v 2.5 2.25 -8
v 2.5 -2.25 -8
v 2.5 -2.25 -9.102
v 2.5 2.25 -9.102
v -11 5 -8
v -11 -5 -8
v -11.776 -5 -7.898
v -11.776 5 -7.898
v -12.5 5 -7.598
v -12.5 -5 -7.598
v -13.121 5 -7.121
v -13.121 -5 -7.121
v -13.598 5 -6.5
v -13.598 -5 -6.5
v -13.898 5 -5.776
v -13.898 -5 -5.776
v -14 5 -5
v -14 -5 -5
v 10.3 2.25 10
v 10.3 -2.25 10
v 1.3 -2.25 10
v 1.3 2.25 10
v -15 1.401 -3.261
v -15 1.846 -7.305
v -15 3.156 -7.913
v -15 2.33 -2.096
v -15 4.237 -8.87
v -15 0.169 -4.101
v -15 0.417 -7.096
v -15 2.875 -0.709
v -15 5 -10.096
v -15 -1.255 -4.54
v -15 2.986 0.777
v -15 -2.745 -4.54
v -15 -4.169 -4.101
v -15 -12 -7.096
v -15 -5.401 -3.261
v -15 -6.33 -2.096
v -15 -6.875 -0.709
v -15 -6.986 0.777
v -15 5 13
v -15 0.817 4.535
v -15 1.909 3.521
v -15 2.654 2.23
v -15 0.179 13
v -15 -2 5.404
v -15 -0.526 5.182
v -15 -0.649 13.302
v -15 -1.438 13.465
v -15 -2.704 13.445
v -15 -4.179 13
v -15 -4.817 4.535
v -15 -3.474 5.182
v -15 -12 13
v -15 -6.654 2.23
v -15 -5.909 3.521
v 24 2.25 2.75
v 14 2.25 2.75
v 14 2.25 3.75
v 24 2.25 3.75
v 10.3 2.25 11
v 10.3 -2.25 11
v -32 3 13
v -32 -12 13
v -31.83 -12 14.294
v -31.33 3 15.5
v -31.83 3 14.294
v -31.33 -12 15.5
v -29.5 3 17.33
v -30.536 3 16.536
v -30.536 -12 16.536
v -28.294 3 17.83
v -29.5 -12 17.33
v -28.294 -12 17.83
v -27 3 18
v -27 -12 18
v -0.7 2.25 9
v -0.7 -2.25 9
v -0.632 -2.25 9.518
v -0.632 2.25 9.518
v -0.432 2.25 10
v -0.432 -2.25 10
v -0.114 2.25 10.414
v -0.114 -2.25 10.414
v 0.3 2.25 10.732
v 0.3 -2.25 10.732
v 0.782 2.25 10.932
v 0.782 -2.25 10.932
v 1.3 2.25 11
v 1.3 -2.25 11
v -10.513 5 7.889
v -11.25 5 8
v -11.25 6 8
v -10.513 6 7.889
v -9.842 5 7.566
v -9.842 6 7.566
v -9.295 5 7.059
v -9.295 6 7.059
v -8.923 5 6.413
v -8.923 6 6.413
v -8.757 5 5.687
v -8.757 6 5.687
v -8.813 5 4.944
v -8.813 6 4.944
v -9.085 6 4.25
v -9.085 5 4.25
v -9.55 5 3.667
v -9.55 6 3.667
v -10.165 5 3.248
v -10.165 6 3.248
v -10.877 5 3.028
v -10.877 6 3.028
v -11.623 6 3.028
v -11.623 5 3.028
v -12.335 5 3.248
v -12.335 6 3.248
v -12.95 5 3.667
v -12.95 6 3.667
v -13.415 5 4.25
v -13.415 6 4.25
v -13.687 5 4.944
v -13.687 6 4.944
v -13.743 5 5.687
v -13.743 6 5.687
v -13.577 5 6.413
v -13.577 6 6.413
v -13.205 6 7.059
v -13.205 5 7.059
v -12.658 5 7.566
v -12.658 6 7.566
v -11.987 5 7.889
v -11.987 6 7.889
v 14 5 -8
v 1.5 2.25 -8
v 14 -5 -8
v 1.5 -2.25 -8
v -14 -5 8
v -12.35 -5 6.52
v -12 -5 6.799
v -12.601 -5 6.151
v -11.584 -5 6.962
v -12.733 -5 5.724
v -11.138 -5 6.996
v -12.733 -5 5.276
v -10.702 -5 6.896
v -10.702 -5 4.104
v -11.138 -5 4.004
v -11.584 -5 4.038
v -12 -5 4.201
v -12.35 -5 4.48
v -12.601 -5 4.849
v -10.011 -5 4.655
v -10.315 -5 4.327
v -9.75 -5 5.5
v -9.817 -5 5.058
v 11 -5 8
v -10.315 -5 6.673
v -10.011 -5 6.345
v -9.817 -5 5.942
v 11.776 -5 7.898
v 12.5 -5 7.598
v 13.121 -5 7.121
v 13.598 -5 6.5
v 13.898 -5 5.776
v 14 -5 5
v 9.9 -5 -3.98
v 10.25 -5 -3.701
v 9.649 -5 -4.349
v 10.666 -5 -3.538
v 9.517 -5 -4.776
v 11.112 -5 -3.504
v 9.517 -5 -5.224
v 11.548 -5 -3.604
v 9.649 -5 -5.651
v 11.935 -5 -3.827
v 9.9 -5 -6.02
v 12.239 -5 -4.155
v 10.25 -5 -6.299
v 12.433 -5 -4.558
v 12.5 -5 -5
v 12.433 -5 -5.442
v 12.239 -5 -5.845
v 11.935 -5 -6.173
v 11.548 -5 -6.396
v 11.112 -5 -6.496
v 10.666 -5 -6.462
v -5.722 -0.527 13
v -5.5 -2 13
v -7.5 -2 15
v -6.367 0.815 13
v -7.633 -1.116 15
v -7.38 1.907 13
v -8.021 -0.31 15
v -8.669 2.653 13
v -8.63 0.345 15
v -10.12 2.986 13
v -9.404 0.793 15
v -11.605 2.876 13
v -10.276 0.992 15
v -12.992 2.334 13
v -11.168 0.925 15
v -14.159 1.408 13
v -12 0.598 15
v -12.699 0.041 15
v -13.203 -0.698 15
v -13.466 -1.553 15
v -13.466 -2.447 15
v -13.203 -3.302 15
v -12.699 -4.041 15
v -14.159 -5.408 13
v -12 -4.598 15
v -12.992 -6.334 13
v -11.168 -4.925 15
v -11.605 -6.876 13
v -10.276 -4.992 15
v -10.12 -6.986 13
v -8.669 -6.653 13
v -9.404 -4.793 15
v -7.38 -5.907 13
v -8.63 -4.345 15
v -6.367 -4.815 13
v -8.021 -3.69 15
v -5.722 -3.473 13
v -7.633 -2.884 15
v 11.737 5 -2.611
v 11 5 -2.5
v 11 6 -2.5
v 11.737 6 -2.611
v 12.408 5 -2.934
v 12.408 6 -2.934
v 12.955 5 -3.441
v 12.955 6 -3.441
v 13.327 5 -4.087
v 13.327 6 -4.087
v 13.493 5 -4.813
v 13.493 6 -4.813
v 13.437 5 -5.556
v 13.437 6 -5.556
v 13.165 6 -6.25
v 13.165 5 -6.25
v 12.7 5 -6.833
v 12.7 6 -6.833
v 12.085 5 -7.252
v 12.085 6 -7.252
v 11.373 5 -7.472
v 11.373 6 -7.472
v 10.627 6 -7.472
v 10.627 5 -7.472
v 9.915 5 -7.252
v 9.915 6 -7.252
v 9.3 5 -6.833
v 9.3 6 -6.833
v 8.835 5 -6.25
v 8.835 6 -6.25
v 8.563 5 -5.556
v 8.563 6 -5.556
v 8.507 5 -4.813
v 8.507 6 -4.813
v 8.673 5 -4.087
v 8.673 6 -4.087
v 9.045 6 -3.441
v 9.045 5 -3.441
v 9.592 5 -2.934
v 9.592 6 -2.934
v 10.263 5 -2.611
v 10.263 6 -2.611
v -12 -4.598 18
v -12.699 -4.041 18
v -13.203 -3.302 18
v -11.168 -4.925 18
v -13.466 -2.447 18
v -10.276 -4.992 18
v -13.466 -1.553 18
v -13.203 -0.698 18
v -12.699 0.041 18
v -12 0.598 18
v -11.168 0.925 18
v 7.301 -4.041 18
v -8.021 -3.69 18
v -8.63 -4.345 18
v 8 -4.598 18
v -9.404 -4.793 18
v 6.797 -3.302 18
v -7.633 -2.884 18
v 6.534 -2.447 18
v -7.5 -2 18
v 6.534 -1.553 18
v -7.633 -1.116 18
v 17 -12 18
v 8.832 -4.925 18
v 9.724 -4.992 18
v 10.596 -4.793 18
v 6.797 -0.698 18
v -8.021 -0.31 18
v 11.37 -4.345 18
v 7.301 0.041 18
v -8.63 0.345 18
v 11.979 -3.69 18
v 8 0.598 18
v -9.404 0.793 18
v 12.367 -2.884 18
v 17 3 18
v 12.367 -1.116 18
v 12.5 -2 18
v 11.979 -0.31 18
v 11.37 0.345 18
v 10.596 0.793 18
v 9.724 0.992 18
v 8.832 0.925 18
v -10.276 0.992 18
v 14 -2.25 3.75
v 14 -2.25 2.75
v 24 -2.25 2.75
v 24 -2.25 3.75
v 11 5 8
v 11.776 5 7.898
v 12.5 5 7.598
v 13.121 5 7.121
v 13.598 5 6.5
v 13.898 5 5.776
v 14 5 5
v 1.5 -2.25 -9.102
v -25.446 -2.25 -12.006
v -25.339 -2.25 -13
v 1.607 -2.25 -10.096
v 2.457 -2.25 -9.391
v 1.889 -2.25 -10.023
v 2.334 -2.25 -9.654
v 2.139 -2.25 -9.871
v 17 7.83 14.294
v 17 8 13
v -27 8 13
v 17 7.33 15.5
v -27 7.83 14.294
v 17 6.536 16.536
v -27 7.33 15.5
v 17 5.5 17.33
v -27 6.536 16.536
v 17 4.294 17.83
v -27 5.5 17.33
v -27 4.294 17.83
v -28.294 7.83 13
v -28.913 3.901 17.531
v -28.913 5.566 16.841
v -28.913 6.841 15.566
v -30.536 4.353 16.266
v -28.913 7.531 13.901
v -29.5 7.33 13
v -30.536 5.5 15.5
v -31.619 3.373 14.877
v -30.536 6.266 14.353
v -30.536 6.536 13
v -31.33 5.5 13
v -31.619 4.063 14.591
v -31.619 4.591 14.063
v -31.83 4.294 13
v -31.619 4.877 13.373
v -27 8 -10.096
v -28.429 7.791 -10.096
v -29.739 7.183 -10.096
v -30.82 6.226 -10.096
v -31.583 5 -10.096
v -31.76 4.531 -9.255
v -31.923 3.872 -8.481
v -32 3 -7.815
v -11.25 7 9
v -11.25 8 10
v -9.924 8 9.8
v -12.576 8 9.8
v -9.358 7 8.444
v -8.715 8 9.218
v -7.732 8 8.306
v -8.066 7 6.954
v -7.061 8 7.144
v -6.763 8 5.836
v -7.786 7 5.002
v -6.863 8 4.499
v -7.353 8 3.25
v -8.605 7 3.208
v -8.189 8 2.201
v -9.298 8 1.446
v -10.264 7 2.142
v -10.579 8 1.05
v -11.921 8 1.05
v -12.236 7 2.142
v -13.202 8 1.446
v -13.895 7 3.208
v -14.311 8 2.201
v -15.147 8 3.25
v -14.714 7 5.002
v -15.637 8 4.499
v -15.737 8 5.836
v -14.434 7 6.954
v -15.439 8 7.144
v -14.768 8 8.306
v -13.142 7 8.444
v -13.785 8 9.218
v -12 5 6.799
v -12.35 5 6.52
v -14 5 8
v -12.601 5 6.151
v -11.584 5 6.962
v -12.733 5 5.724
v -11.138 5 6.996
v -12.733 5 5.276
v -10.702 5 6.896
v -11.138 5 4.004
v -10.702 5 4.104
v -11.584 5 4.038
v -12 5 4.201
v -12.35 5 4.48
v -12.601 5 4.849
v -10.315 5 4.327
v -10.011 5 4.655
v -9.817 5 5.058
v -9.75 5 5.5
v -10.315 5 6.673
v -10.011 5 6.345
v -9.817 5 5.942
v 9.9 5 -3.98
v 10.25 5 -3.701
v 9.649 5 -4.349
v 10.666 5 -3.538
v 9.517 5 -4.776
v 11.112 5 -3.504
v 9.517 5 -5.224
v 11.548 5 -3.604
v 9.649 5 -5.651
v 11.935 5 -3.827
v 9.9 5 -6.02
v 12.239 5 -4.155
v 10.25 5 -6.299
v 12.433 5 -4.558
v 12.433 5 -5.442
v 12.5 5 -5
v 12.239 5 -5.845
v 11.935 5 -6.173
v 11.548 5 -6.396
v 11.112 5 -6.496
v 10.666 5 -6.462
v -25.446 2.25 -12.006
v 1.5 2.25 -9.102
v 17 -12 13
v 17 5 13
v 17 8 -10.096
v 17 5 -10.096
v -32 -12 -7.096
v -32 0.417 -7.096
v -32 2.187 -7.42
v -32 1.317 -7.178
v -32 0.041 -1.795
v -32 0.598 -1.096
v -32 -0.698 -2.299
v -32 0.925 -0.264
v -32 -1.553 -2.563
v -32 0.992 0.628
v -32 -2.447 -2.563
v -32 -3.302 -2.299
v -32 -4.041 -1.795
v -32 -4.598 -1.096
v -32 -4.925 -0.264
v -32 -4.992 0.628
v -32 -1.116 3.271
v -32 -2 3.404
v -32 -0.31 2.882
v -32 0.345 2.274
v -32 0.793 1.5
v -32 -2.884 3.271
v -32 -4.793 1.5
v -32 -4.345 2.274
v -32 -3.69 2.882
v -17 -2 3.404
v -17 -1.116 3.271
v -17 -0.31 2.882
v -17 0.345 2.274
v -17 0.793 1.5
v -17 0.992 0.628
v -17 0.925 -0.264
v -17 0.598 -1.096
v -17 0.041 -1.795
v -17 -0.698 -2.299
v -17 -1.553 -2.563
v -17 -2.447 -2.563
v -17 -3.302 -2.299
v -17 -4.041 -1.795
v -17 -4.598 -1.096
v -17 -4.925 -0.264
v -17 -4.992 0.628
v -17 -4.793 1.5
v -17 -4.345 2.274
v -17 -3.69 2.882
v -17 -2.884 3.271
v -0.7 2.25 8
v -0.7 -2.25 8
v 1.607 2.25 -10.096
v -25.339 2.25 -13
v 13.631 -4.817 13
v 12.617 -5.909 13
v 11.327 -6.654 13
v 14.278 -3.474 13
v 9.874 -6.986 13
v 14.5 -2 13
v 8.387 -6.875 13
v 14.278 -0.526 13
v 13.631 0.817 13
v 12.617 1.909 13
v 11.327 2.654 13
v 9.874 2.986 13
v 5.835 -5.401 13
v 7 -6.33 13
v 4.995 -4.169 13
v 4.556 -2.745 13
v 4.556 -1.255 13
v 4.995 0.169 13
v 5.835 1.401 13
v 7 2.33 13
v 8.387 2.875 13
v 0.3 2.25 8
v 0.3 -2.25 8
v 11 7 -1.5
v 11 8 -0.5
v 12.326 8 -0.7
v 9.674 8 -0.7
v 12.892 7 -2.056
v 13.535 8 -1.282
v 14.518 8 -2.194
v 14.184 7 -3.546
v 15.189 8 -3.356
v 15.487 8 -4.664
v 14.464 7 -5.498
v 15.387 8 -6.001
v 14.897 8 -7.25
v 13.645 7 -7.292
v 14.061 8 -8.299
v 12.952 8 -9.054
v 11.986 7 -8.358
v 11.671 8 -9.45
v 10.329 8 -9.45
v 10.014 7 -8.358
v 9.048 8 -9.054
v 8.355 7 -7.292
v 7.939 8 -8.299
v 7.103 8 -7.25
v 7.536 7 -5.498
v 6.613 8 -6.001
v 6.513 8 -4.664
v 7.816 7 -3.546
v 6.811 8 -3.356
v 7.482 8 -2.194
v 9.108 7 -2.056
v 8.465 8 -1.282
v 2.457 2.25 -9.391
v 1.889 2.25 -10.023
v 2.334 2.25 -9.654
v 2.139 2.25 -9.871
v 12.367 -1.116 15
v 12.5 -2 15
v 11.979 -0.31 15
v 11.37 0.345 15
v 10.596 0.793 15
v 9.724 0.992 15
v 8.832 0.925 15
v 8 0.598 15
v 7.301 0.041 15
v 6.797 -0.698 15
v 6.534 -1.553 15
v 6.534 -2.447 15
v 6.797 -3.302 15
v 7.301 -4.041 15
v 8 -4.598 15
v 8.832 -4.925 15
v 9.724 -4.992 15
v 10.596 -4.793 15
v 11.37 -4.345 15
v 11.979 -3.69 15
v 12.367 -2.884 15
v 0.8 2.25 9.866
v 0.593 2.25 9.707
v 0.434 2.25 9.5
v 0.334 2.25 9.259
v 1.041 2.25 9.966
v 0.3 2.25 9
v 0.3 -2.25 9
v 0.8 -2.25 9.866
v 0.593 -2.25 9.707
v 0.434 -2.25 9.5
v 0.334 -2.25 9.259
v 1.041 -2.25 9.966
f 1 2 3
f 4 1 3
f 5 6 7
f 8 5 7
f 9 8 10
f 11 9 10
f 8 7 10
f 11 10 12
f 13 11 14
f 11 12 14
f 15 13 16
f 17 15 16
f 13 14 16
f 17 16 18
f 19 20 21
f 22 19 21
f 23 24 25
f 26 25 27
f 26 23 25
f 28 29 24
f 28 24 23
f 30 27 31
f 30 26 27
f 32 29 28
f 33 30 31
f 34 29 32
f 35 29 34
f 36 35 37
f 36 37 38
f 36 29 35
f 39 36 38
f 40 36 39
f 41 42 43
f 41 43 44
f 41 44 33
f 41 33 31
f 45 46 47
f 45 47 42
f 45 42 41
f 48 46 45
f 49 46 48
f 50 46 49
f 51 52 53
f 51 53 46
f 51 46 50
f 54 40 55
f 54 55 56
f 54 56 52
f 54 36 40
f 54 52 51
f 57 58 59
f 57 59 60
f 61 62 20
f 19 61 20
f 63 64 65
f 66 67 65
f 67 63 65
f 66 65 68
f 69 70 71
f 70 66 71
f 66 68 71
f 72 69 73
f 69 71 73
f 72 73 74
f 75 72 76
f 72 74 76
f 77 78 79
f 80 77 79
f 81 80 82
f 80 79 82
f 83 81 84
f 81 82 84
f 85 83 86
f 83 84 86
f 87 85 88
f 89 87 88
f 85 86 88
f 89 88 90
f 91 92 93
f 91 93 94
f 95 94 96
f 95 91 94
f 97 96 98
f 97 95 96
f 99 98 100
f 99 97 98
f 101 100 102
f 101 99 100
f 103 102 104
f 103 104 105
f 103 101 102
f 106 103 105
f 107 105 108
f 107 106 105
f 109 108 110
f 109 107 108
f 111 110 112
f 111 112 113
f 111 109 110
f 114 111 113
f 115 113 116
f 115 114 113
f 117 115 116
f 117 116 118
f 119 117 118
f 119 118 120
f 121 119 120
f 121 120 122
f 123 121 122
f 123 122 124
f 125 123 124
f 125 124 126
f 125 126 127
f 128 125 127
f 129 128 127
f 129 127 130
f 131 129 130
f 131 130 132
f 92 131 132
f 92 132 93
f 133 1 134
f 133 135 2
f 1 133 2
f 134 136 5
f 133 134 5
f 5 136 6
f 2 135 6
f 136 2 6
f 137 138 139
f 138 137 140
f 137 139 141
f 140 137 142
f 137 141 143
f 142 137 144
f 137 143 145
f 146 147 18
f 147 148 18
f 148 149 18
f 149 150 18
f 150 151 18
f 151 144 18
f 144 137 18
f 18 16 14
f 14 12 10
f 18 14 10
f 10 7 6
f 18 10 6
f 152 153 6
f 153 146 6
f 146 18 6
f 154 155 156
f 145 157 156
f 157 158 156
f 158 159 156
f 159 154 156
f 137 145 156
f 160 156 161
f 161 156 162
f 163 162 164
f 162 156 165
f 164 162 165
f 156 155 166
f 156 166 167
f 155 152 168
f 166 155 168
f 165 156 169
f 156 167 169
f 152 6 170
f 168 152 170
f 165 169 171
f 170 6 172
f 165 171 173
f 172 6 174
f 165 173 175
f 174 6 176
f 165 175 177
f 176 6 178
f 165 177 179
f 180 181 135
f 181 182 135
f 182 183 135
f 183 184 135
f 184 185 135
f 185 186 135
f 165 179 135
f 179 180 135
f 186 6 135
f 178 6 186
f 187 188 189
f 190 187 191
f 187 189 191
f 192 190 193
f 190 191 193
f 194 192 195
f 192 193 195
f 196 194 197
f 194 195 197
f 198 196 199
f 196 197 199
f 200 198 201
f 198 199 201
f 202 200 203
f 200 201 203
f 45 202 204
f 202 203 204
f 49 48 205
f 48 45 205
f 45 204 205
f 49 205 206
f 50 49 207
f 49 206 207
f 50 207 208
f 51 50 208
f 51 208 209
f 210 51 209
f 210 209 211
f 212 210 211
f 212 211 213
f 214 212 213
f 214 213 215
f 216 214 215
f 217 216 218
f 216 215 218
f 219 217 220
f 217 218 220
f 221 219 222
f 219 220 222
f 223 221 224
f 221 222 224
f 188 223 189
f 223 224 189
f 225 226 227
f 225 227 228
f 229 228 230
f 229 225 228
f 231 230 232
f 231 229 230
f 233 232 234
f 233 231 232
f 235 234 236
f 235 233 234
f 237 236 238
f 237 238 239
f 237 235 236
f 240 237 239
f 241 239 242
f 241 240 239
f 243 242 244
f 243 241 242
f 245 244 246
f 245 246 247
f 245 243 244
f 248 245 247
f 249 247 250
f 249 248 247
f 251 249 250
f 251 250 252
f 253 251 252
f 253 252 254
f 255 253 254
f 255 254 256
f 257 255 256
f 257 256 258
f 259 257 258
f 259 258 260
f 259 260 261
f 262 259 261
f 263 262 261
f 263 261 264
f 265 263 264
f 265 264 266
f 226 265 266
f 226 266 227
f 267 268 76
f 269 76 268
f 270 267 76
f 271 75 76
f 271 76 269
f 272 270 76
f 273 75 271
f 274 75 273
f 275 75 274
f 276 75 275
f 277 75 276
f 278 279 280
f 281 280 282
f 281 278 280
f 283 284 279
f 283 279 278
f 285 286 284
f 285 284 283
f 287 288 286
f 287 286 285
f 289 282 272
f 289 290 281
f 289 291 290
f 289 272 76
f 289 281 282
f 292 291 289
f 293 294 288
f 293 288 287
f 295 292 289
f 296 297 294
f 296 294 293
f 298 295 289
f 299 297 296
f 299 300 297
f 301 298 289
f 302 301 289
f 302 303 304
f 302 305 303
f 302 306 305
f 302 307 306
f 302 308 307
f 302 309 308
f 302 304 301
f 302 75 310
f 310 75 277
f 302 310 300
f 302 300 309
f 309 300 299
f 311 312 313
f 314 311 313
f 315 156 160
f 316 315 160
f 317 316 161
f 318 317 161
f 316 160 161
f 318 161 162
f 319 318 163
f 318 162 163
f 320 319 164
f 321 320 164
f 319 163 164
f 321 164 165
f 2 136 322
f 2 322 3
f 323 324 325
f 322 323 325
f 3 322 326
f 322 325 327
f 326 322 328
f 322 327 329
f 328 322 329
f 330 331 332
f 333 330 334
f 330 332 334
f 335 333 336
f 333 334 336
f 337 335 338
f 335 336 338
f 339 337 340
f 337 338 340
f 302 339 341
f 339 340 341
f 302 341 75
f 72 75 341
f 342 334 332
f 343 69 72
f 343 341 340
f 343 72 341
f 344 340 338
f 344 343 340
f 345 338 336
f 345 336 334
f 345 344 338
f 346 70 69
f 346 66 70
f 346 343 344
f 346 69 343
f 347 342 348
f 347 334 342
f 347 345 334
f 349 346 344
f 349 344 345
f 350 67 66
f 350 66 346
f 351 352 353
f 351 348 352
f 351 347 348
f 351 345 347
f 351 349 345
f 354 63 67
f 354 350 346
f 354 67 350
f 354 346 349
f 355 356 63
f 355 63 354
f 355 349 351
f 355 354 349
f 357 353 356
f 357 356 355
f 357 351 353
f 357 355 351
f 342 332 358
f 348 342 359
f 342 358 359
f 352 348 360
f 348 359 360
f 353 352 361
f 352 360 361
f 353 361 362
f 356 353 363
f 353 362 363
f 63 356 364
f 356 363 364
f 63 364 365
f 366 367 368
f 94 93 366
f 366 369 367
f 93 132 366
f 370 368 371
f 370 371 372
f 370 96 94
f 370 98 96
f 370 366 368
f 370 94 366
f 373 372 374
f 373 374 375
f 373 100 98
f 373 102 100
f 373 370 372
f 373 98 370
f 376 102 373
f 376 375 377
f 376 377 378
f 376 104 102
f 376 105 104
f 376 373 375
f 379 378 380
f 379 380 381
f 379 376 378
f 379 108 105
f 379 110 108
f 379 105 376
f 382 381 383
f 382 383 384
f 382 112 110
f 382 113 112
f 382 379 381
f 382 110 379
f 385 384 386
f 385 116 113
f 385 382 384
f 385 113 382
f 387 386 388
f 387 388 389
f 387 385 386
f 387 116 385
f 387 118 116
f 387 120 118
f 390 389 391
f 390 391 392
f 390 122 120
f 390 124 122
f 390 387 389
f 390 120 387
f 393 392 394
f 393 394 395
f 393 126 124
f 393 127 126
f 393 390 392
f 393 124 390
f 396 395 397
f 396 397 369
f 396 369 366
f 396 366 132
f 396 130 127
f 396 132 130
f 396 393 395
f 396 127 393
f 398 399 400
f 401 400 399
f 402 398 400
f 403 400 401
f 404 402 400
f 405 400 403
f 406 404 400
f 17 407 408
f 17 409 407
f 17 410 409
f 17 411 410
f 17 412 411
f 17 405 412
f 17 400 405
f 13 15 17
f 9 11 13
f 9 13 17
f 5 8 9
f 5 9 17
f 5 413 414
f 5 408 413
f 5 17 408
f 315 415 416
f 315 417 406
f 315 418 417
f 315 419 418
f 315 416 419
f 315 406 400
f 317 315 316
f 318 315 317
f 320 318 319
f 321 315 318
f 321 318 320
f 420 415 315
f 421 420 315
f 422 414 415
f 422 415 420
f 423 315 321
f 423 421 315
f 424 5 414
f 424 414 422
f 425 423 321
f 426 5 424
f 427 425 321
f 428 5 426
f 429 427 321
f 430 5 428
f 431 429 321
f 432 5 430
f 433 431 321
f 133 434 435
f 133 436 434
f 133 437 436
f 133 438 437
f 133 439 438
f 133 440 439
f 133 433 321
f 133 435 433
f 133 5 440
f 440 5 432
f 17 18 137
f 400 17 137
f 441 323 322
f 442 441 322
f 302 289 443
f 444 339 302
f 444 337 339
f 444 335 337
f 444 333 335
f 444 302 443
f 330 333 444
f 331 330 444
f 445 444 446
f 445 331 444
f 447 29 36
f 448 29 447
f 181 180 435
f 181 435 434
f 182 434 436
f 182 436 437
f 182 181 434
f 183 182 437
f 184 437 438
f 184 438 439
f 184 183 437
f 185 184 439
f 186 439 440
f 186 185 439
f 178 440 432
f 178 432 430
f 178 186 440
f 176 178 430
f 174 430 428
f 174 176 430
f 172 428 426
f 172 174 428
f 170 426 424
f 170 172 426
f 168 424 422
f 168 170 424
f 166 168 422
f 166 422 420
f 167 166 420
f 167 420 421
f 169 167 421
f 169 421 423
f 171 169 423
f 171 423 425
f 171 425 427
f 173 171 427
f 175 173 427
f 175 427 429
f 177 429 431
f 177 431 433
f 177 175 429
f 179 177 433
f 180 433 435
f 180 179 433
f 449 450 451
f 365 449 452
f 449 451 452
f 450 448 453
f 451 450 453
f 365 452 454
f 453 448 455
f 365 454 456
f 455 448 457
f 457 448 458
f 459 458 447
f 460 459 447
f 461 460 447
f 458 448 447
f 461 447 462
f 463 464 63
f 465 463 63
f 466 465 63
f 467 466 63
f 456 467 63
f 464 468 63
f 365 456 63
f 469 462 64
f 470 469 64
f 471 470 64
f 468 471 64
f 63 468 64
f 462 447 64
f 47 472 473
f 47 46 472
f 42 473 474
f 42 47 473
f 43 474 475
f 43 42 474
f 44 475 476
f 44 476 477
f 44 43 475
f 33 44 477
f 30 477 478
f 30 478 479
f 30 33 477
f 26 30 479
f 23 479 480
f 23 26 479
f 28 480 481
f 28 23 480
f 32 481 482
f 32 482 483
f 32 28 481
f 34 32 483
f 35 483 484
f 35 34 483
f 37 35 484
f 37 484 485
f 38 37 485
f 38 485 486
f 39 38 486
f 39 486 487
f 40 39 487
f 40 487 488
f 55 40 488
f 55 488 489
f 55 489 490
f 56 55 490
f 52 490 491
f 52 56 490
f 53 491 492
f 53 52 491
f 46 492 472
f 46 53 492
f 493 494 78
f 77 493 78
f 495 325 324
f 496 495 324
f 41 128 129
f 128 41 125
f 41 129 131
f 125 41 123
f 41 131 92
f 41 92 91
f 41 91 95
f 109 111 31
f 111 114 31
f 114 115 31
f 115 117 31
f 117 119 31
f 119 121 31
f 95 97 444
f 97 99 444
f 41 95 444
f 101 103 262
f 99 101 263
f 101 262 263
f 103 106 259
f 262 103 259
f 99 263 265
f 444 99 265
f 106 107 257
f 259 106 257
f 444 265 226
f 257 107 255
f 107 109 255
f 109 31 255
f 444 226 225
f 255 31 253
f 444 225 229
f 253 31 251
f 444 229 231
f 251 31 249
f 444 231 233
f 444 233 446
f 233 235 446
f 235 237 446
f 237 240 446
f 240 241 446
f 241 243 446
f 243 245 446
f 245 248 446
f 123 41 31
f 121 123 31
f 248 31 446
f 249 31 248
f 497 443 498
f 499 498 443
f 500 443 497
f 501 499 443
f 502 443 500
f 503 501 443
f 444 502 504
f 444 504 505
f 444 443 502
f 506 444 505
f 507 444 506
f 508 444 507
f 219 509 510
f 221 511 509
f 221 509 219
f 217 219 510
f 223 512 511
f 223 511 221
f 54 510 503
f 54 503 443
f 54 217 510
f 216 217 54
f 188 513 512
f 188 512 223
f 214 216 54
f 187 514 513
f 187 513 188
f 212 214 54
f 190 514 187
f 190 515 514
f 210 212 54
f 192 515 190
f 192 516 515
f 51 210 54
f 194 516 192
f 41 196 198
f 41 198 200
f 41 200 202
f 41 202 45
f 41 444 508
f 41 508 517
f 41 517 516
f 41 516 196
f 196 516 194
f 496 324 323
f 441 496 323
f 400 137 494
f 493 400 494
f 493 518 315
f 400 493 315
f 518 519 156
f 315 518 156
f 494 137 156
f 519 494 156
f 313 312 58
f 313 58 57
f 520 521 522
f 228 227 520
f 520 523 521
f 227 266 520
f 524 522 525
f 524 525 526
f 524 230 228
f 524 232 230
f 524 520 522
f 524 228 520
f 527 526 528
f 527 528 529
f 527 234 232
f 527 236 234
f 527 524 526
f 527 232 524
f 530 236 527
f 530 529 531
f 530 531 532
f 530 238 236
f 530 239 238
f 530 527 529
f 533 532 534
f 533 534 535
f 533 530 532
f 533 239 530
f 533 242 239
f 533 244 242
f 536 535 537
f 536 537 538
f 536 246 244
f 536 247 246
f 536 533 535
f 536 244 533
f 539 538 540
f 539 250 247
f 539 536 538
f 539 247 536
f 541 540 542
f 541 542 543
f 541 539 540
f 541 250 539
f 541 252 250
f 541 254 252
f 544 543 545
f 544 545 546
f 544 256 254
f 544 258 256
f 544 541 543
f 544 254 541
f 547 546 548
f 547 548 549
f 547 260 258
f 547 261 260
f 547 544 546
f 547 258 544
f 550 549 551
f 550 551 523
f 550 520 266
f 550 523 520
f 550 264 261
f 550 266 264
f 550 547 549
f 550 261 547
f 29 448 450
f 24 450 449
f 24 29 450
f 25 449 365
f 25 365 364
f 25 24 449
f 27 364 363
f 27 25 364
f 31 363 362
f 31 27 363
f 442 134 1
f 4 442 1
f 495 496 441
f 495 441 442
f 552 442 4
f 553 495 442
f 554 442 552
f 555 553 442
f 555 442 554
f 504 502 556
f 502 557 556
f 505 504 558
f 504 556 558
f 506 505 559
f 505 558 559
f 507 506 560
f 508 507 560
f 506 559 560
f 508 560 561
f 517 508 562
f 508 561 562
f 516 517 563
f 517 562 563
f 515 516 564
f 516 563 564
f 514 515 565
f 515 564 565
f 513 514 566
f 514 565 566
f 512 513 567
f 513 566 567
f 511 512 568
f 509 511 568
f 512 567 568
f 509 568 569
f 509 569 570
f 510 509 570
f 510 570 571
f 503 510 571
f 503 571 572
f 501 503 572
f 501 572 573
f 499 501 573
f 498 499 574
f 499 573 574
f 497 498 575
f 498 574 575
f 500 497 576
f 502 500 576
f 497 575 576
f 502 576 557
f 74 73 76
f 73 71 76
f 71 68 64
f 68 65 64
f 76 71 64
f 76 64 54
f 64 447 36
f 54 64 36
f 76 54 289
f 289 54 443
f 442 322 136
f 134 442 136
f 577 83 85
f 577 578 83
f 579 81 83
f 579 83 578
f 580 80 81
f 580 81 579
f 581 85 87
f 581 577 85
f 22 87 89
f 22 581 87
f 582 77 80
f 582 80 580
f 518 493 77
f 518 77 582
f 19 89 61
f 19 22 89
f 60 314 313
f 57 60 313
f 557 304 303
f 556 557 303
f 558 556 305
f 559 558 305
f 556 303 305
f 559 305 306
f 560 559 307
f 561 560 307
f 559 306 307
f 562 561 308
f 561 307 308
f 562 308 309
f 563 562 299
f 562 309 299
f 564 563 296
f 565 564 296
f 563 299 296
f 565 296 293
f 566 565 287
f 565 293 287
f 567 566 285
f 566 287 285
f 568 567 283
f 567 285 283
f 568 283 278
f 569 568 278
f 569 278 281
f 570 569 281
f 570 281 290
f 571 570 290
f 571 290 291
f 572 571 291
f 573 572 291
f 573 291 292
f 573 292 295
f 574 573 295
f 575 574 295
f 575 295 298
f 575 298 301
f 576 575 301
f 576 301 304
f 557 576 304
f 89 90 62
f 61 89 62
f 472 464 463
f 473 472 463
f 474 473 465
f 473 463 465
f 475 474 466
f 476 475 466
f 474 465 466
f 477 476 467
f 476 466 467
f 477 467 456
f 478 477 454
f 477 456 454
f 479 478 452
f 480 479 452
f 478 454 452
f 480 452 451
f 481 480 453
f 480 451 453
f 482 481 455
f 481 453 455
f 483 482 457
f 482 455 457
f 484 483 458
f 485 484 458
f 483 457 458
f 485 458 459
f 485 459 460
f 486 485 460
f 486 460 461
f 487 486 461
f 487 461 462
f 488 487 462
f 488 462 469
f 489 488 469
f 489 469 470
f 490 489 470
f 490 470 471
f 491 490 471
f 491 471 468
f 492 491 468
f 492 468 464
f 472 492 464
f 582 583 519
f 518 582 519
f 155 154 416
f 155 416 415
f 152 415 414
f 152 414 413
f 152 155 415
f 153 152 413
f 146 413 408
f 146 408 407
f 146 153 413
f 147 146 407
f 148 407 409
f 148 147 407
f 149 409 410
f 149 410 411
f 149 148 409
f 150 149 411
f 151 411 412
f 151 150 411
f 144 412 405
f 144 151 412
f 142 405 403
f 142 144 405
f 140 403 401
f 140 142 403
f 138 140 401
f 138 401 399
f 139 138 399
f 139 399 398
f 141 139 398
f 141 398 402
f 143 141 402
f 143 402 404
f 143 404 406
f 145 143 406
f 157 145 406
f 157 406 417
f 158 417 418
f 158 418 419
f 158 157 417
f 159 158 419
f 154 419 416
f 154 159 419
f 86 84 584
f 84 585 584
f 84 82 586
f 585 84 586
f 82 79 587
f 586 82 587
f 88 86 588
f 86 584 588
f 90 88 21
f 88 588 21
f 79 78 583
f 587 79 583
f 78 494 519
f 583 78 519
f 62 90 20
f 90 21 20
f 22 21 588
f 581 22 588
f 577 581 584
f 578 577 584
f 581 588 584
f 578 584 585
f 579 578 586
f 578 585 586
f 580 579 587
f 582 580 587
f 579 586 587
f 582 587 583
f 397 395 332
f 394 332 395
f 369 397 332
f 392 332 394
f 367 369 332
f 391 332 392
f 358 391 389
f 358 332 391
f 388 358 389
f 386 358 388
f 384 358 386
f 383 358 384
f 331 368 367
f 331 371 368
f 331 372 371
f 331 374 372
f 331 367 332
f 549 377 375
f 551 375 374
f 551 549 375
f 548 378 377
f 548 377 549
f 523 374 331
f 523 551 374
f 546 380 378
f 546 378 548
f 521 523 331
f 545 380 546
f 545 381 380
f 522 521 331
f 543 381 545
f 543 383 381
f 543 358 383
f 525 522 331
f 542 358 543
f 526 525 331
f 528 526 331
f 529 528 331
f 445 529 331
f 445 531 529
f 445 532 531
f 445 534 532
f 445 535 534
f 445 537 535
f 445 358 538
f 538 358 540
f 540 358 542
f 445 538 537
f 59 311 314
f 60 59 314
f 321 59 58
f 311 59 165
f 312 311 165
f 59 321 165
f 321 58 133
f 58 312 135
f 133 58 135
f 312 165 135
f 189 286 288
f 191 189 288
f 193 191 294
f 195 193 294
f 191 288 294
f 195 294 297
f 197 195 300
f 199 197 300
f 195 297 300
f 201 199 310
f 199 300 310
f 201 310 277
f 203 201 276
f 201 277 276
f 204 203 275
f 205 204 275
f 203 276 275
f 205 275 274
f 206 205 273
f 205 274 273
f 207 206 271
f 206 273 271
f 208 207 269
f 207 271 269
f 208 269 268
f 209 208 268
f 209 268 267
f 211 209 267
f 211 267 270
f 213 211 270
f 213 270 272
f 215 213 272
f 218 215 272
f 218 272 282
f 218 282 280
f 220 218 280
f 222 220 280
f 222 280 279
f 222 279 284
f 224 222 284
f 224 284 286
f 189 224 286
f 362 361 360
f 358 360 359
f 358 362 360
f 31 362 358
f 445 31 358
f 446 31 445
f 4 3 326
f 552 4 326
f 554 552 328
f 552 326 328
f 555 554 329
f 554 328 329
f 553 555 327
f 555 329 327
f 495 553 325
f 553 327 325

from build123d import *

# Parameters (mm, degrees)
LIMIT_START                     = -5
LIMIT_SWITCH_LARGER_OUTLINE_R   = 1.5
LIMIT_SWITCH_LARGER_DEPTH       = 10
LIMIT_START_2                   = -2.25
LIMIT_SWITCH_LARGER_2_OUTLINE_W = 10
LIMIT_SWITCH_LARGER_2_OUTLINE_H = 1
LIMIT_SWITCH_LARGER_2_DEPTH     = 4.5
SKETCH1_W                       = 49
SKETCH1_H                       = 28.096217126
SKETCH1_R                       = 2.5
BOSS_EXTRUDE2_DEPTH             = 3
BOSS_EXTRUDE3_DEPTH             = 17
SKETCH5_R                       = 3
CUT_EXTRUDE2_DEPTH              = 17
SKETCH6_R                       = 3
CUT_EXTRUDE3_DEPTH              = 61.033324079
CHAMFER2_SIZE                   = 2
FILLET2_R                       = 5
FILLET3_R                       = 5


with BuildPart() as part:
    # Limit Switch_Larger: read off the stored shape, not the designer's step
    # Limit Switch_Larger outline → Limit Switch_Larger (new body)
    with BuildSketch(Plane(origin=(0, 0, 0), x_dir=(1, 0, 0), z_dir=(0, 1, 0)).offset(LIMIT_START)):
        with BuildLine():
            Line((14, -5), (14, 8))
            Line((14, 8), (-11, 8))
            ThreePointArc((-11, 8), (-13.121320344, 7.121320344), (-14, 5))
            Line((-14, 5), (-14, -8))
            Line((-14, -8), (11, -8))
            ThreePointArc((11, -8), (13.121320344, -7.121320344), (14, -5))
        make_face()
        with Locations((-11.25, -5.5)):
            Circle(LIMIT_SWITCH_LARGER_OUTLINE_R, mode=Mode.SUBTRACT)
        with Locations((11, 5)):
            Circle(LIMIT_SWITCH_LARGER_OUTLINE_R, mode=Mode.SUBTRACT)
    extrude(amount=LIMIT_SWITCH_LARGER_DEPTH)

    # Limit Switch_Larger 2 outline → Limit Switch_Larger 2 (add)
    with BuildSketch(Plane(origin=(0, 0, 0), x_dir=(1, 0, 0), z_dir=(0, 1, 0)).offset(LIMIT_START_2)):
        with Locations((19, -3.25)):
            Rectangle(LIMIT_SWITCH_LARGER_2_OUTLINE_W, LIMIT_SWITCH_LARGER_2_OUTLINE_H)
        with BuildLine():
            Line((1.5, 8), (2.5, 8))
            Line((2.5, 8), (2.5, 9.10197349))
            ThreePointArc((2.5, 9.10197349), (2.244023809, 9.770126595), (1.607142857, 10.096217126))
            Line((1.607142857, 10.096217126), (-25.338821814, 13))
            Line((-25.338821814, 13), (-25.445964671, 12.005756364))
            Line((-25.445964671, 12.005756364), (1.5, 9.10197349))
            Line((1.5, 9.10197349), (1.5, 8))
        make_face()
        with BuildLine():
            Line((0.3, -9), (0.3, -8))
            Line((0.3, -8), (-0.7, -8))
            Line((-0.7, -8), (-0.7, -9))
            ThreePointArc((-0.7, -9), (-0.114213562, -10.414213562), (1.3, -11))
            Line((1.3, -11), (10.3, -11))
            Line((10.3, -11), (10.3, -10))
            Line((10.3, -10), (1.3, -10))
            ThreePointArc((1.3, -10), (0.592893219, -9.707106781), (0.3, -9))
        make_face()
    extrude(amount=LIMIT_SWITCH_LARGER_2_DEPTH)


with BuildPart() as body_2:
    # Sketch1 → Boss-Extrude2 (new body)
    with BuildSketch(Plane(origin=(0, 5, 0), x_dir=(1, 0, 0), z_dir=(0, 1, 0))):
        with Locations((-7.5, -3.951891437)):
            Rectangle(SKETCH1_W, SKETCH1_H)
        with Locations(Location((-11.25, -5.5, 0), (0, 0, 270))):
            Circle(SKETCH1_R, mode=Mode.SUBTRACT)
        with Locations(Location((11, 5, 0), (0, 0, 270))):
            Circle(SKETCH1_R, mode=Mode.SUBTRACT)
    extrude(amount=BOSS_EXTRUDE2_DEPTH)

    # Sketch1<3> → Boss-Extrude3 (add)
    with BuildSketch(Plane(origin=(0, 5, 0), x_dir=(1, 0, 0), z_dir=(0, 1, 0))):
        Polygon((17, -18), (17, -13), (-15, -13), (-15, 7.096217126), (-32, 7.096217126), (-32, -18), align=None)
    extrude(amount=-BOSS_EXTRUDE3_DEPTH)

    # Sketch5 → Cut-Extrude2 (cut)
    with BuildSketch(Plane.XY.offset(18)):
        with Locations((-10.5, -2)):
            Circle(SKETCH5_R)
        with Locations((9.5, -2)):
            Circle(SKETCH5_R)
    extrude(amount=-CUT_EXTRUDE2_DEPTH, mode=Mode.SUBTRACT)

    # Sketch6 → Cut-Extrude3 (cut, through all)
    with BuildSketch(Plane.ZY.offset(32)):
        with Locations((0.403782874, -2)):
            Circle(SKETCH6_R)
    extrude(amount=-CUT_EXTRUDE3_DEPTH, mode=Mode.SUBTRACT)

    # Chamfer2
    # the kernel refuses this chamfer: 2 mm, written as the material it takes off along each edge
    with BuildSketch(Plane(origin=(-11.25, 8, 5.5), x_dir=(0, 0, 1), z_dir=(-1, 0, 0))) as chamfer2_piece_1:
        Polygon((2.5 + CHAMFER2_SIZE, 0), (2.5, -CHAMFER2_SIZE), (2.5, 0), align=None)
    revolve(axis=Axis((-11.25, 8, 5.5), (0, 1, 0)), mode=Mode.SUBTRACT)
    with BuildSketch(Plane(origin=(11, 8, -5), x_dir=(0, 0, 1), z_dir=(-1, 0, 0))) as chamfer2_piece_2:
        Polygon((2.5 + CHAMFER2_SIZE, 0), (2.5, -CHAMFER2_SIZE), (2.5, 0), align=None)
    revolve(axis=Axis((11, 8, -5), (0, 1, 0)), mode=Mode.SUBTRACT)
    with BuildSketch(Plane(origin=(-10.5, -2, 13), x_dir=(1, 0, 0), z_dir=(0, -1, 0))) as chamfer2_piece_3_section:
        Polygon((3 + CHAMFER2_SIZE, 0), (3, CHAMFER2_SIZE), (3, 0), align=None)
    chamfer2_piece_3 = revolve(axis=Axis((-10.5, -2, 13), (0, 0, 1)), mode=Mode.PRIVATE)
    chamfer2_piece_3 = split(chamfer2_piece_3, bisect_by=Plane(origin=(-15, -2, 13), z_dir=(1, 0, 0)), keep=Keep.TOP, mode=Mode.PRIVATE)
    add(chamfer2_piece_3, mode=Mode.SUBTRACT)
    with BuildSketch(Plane(origin=(9.5, -2, 13), x_dir=(1, 0, 0), z_dir=(0, -1, 0))) as chamfer2_piece_4:
        Polygon((3 + CHAMFER2_SIZE, 0), (3, CHAMFER2_SIZE), (3, 0), align=None)
    revolve(axis=Axis((9.5, -2, 13), (0, 0, 1)), mode=Mode.SUBTRACT)
    with BuildSketch(Plane(origin=(-15, -2, 0.403782874), x_dir=(0, 0, 1), z_dir=(0, -1, 0))) as chamfer2_piece_5:
        Polygon((3, CHAMFER2_SIZE), (3 + CHAMFER2_SIZE, 0), (3, 0), align=None)
    revolve(axis=Axis((-15, -2, 0.403782874), (-1, 0, 0)), mode=Mode.SUBTRACT)

    # Fillet2
    # the kernel refuses this fillet: 5 mm, written as the material it adds along each edge
    with BuildSketch(Plane(origin=(-15, 5, -7.096217126), x_dir=(0, 0, -1), z_dir=(-1, 0, 0))) as fillet2_piece_1:
        with BuildLine():
            CenterArc((5, 4.582575695), FILLET2_R, 180, 66.421821522)
            Line((0, 4.582575695), (0, 0))
            Line((0, 0), (3, 0))
        make_face()
    extrude(amount=17)
    # the kernel refuses this fillet: 5 mm, written as the material it takes off along each edge
    with BuildSketch(Plane(origin=(-32, -24.5, 18), x_dir=(1, 0, 0), z_dir=(0, 1, 0))) as fillet2_2_piece_1:
        with BuildLine():
            CenterArc((FILLET2_R, FILLET2_R), FILLET2_R, 180, 90)
            Line((0, FILLET2_R), (0, 0))
            Line((0, 0), (FILLET2_R, 0))
        make_face()
    extrude(amount=45, mode=Mode.SUBTRACT)
    with BuildSketch(Plane(origin=(-44.5, 8, 18), x_dir=(0, 0, -1), z_dir=(1, 0, 0))) as fillet2_2_piece_2:
        with BuildLine():
            CenterArc((FILLET2_R, -FILLET2_R), FILLET2_R, 90, 90)
            Line((0, -FILLET2_R), (0, 0))
            Line((0, 0), (FILLET2_R, 0))
        make_face()
    extrude(amount=74, mode=Mode.SUBTRACT)

    # Fillet3
    # the kernel refuses this fillet: 5 mm, written as the material it takes off along each edge
    with BuildSketch(Plane(origin=(-27, 3, 13), x_dir=(0, 1, 0), z_dir=(-1, 0, 0))) as fillet3_piece_1_section:
        Polygon((0, 0), (FILLET3_R, 0), (FILLET3_R, -FILLET3_R), (0, -FILLET3_R), align=None)
    fillet3_piece_1 = extrude(amount=FILLET3_R, mode=Mode.PRIVATE)
    fillet3_piece_1 = fillet3_piece_1 - Plane(origin=(-27, 3, 13), x_dir=(0, -0.7071067811865475, -0.7071067811865475), z_dir=(-1, 0, 0)) * Sphere(FILLET3_R, mode=Mode.PRIVATE)
    add(fillet3_piece_1, mode=Mode.SUBTRACT)
    with BuildSketch(Plane(origin=(-32, 8, -22.596217126), x_dir=(0, -1, 0), z_dir=(0, 0, 1))) as fillet3_piece_2:
        with BuildLine():
            CenterArc((FILLET3_R, FILLET3_R), FILLET3_R, 180, 90)
            Line((0, FILLET3_R), (0, 0))
            Line((0, 0), (FILLET3_R, 0))
        make_face()
    extrude(amount=35.596217126, mode=Mode.SUBTRACT)


solid = Compound([part.part, body_2.part])
